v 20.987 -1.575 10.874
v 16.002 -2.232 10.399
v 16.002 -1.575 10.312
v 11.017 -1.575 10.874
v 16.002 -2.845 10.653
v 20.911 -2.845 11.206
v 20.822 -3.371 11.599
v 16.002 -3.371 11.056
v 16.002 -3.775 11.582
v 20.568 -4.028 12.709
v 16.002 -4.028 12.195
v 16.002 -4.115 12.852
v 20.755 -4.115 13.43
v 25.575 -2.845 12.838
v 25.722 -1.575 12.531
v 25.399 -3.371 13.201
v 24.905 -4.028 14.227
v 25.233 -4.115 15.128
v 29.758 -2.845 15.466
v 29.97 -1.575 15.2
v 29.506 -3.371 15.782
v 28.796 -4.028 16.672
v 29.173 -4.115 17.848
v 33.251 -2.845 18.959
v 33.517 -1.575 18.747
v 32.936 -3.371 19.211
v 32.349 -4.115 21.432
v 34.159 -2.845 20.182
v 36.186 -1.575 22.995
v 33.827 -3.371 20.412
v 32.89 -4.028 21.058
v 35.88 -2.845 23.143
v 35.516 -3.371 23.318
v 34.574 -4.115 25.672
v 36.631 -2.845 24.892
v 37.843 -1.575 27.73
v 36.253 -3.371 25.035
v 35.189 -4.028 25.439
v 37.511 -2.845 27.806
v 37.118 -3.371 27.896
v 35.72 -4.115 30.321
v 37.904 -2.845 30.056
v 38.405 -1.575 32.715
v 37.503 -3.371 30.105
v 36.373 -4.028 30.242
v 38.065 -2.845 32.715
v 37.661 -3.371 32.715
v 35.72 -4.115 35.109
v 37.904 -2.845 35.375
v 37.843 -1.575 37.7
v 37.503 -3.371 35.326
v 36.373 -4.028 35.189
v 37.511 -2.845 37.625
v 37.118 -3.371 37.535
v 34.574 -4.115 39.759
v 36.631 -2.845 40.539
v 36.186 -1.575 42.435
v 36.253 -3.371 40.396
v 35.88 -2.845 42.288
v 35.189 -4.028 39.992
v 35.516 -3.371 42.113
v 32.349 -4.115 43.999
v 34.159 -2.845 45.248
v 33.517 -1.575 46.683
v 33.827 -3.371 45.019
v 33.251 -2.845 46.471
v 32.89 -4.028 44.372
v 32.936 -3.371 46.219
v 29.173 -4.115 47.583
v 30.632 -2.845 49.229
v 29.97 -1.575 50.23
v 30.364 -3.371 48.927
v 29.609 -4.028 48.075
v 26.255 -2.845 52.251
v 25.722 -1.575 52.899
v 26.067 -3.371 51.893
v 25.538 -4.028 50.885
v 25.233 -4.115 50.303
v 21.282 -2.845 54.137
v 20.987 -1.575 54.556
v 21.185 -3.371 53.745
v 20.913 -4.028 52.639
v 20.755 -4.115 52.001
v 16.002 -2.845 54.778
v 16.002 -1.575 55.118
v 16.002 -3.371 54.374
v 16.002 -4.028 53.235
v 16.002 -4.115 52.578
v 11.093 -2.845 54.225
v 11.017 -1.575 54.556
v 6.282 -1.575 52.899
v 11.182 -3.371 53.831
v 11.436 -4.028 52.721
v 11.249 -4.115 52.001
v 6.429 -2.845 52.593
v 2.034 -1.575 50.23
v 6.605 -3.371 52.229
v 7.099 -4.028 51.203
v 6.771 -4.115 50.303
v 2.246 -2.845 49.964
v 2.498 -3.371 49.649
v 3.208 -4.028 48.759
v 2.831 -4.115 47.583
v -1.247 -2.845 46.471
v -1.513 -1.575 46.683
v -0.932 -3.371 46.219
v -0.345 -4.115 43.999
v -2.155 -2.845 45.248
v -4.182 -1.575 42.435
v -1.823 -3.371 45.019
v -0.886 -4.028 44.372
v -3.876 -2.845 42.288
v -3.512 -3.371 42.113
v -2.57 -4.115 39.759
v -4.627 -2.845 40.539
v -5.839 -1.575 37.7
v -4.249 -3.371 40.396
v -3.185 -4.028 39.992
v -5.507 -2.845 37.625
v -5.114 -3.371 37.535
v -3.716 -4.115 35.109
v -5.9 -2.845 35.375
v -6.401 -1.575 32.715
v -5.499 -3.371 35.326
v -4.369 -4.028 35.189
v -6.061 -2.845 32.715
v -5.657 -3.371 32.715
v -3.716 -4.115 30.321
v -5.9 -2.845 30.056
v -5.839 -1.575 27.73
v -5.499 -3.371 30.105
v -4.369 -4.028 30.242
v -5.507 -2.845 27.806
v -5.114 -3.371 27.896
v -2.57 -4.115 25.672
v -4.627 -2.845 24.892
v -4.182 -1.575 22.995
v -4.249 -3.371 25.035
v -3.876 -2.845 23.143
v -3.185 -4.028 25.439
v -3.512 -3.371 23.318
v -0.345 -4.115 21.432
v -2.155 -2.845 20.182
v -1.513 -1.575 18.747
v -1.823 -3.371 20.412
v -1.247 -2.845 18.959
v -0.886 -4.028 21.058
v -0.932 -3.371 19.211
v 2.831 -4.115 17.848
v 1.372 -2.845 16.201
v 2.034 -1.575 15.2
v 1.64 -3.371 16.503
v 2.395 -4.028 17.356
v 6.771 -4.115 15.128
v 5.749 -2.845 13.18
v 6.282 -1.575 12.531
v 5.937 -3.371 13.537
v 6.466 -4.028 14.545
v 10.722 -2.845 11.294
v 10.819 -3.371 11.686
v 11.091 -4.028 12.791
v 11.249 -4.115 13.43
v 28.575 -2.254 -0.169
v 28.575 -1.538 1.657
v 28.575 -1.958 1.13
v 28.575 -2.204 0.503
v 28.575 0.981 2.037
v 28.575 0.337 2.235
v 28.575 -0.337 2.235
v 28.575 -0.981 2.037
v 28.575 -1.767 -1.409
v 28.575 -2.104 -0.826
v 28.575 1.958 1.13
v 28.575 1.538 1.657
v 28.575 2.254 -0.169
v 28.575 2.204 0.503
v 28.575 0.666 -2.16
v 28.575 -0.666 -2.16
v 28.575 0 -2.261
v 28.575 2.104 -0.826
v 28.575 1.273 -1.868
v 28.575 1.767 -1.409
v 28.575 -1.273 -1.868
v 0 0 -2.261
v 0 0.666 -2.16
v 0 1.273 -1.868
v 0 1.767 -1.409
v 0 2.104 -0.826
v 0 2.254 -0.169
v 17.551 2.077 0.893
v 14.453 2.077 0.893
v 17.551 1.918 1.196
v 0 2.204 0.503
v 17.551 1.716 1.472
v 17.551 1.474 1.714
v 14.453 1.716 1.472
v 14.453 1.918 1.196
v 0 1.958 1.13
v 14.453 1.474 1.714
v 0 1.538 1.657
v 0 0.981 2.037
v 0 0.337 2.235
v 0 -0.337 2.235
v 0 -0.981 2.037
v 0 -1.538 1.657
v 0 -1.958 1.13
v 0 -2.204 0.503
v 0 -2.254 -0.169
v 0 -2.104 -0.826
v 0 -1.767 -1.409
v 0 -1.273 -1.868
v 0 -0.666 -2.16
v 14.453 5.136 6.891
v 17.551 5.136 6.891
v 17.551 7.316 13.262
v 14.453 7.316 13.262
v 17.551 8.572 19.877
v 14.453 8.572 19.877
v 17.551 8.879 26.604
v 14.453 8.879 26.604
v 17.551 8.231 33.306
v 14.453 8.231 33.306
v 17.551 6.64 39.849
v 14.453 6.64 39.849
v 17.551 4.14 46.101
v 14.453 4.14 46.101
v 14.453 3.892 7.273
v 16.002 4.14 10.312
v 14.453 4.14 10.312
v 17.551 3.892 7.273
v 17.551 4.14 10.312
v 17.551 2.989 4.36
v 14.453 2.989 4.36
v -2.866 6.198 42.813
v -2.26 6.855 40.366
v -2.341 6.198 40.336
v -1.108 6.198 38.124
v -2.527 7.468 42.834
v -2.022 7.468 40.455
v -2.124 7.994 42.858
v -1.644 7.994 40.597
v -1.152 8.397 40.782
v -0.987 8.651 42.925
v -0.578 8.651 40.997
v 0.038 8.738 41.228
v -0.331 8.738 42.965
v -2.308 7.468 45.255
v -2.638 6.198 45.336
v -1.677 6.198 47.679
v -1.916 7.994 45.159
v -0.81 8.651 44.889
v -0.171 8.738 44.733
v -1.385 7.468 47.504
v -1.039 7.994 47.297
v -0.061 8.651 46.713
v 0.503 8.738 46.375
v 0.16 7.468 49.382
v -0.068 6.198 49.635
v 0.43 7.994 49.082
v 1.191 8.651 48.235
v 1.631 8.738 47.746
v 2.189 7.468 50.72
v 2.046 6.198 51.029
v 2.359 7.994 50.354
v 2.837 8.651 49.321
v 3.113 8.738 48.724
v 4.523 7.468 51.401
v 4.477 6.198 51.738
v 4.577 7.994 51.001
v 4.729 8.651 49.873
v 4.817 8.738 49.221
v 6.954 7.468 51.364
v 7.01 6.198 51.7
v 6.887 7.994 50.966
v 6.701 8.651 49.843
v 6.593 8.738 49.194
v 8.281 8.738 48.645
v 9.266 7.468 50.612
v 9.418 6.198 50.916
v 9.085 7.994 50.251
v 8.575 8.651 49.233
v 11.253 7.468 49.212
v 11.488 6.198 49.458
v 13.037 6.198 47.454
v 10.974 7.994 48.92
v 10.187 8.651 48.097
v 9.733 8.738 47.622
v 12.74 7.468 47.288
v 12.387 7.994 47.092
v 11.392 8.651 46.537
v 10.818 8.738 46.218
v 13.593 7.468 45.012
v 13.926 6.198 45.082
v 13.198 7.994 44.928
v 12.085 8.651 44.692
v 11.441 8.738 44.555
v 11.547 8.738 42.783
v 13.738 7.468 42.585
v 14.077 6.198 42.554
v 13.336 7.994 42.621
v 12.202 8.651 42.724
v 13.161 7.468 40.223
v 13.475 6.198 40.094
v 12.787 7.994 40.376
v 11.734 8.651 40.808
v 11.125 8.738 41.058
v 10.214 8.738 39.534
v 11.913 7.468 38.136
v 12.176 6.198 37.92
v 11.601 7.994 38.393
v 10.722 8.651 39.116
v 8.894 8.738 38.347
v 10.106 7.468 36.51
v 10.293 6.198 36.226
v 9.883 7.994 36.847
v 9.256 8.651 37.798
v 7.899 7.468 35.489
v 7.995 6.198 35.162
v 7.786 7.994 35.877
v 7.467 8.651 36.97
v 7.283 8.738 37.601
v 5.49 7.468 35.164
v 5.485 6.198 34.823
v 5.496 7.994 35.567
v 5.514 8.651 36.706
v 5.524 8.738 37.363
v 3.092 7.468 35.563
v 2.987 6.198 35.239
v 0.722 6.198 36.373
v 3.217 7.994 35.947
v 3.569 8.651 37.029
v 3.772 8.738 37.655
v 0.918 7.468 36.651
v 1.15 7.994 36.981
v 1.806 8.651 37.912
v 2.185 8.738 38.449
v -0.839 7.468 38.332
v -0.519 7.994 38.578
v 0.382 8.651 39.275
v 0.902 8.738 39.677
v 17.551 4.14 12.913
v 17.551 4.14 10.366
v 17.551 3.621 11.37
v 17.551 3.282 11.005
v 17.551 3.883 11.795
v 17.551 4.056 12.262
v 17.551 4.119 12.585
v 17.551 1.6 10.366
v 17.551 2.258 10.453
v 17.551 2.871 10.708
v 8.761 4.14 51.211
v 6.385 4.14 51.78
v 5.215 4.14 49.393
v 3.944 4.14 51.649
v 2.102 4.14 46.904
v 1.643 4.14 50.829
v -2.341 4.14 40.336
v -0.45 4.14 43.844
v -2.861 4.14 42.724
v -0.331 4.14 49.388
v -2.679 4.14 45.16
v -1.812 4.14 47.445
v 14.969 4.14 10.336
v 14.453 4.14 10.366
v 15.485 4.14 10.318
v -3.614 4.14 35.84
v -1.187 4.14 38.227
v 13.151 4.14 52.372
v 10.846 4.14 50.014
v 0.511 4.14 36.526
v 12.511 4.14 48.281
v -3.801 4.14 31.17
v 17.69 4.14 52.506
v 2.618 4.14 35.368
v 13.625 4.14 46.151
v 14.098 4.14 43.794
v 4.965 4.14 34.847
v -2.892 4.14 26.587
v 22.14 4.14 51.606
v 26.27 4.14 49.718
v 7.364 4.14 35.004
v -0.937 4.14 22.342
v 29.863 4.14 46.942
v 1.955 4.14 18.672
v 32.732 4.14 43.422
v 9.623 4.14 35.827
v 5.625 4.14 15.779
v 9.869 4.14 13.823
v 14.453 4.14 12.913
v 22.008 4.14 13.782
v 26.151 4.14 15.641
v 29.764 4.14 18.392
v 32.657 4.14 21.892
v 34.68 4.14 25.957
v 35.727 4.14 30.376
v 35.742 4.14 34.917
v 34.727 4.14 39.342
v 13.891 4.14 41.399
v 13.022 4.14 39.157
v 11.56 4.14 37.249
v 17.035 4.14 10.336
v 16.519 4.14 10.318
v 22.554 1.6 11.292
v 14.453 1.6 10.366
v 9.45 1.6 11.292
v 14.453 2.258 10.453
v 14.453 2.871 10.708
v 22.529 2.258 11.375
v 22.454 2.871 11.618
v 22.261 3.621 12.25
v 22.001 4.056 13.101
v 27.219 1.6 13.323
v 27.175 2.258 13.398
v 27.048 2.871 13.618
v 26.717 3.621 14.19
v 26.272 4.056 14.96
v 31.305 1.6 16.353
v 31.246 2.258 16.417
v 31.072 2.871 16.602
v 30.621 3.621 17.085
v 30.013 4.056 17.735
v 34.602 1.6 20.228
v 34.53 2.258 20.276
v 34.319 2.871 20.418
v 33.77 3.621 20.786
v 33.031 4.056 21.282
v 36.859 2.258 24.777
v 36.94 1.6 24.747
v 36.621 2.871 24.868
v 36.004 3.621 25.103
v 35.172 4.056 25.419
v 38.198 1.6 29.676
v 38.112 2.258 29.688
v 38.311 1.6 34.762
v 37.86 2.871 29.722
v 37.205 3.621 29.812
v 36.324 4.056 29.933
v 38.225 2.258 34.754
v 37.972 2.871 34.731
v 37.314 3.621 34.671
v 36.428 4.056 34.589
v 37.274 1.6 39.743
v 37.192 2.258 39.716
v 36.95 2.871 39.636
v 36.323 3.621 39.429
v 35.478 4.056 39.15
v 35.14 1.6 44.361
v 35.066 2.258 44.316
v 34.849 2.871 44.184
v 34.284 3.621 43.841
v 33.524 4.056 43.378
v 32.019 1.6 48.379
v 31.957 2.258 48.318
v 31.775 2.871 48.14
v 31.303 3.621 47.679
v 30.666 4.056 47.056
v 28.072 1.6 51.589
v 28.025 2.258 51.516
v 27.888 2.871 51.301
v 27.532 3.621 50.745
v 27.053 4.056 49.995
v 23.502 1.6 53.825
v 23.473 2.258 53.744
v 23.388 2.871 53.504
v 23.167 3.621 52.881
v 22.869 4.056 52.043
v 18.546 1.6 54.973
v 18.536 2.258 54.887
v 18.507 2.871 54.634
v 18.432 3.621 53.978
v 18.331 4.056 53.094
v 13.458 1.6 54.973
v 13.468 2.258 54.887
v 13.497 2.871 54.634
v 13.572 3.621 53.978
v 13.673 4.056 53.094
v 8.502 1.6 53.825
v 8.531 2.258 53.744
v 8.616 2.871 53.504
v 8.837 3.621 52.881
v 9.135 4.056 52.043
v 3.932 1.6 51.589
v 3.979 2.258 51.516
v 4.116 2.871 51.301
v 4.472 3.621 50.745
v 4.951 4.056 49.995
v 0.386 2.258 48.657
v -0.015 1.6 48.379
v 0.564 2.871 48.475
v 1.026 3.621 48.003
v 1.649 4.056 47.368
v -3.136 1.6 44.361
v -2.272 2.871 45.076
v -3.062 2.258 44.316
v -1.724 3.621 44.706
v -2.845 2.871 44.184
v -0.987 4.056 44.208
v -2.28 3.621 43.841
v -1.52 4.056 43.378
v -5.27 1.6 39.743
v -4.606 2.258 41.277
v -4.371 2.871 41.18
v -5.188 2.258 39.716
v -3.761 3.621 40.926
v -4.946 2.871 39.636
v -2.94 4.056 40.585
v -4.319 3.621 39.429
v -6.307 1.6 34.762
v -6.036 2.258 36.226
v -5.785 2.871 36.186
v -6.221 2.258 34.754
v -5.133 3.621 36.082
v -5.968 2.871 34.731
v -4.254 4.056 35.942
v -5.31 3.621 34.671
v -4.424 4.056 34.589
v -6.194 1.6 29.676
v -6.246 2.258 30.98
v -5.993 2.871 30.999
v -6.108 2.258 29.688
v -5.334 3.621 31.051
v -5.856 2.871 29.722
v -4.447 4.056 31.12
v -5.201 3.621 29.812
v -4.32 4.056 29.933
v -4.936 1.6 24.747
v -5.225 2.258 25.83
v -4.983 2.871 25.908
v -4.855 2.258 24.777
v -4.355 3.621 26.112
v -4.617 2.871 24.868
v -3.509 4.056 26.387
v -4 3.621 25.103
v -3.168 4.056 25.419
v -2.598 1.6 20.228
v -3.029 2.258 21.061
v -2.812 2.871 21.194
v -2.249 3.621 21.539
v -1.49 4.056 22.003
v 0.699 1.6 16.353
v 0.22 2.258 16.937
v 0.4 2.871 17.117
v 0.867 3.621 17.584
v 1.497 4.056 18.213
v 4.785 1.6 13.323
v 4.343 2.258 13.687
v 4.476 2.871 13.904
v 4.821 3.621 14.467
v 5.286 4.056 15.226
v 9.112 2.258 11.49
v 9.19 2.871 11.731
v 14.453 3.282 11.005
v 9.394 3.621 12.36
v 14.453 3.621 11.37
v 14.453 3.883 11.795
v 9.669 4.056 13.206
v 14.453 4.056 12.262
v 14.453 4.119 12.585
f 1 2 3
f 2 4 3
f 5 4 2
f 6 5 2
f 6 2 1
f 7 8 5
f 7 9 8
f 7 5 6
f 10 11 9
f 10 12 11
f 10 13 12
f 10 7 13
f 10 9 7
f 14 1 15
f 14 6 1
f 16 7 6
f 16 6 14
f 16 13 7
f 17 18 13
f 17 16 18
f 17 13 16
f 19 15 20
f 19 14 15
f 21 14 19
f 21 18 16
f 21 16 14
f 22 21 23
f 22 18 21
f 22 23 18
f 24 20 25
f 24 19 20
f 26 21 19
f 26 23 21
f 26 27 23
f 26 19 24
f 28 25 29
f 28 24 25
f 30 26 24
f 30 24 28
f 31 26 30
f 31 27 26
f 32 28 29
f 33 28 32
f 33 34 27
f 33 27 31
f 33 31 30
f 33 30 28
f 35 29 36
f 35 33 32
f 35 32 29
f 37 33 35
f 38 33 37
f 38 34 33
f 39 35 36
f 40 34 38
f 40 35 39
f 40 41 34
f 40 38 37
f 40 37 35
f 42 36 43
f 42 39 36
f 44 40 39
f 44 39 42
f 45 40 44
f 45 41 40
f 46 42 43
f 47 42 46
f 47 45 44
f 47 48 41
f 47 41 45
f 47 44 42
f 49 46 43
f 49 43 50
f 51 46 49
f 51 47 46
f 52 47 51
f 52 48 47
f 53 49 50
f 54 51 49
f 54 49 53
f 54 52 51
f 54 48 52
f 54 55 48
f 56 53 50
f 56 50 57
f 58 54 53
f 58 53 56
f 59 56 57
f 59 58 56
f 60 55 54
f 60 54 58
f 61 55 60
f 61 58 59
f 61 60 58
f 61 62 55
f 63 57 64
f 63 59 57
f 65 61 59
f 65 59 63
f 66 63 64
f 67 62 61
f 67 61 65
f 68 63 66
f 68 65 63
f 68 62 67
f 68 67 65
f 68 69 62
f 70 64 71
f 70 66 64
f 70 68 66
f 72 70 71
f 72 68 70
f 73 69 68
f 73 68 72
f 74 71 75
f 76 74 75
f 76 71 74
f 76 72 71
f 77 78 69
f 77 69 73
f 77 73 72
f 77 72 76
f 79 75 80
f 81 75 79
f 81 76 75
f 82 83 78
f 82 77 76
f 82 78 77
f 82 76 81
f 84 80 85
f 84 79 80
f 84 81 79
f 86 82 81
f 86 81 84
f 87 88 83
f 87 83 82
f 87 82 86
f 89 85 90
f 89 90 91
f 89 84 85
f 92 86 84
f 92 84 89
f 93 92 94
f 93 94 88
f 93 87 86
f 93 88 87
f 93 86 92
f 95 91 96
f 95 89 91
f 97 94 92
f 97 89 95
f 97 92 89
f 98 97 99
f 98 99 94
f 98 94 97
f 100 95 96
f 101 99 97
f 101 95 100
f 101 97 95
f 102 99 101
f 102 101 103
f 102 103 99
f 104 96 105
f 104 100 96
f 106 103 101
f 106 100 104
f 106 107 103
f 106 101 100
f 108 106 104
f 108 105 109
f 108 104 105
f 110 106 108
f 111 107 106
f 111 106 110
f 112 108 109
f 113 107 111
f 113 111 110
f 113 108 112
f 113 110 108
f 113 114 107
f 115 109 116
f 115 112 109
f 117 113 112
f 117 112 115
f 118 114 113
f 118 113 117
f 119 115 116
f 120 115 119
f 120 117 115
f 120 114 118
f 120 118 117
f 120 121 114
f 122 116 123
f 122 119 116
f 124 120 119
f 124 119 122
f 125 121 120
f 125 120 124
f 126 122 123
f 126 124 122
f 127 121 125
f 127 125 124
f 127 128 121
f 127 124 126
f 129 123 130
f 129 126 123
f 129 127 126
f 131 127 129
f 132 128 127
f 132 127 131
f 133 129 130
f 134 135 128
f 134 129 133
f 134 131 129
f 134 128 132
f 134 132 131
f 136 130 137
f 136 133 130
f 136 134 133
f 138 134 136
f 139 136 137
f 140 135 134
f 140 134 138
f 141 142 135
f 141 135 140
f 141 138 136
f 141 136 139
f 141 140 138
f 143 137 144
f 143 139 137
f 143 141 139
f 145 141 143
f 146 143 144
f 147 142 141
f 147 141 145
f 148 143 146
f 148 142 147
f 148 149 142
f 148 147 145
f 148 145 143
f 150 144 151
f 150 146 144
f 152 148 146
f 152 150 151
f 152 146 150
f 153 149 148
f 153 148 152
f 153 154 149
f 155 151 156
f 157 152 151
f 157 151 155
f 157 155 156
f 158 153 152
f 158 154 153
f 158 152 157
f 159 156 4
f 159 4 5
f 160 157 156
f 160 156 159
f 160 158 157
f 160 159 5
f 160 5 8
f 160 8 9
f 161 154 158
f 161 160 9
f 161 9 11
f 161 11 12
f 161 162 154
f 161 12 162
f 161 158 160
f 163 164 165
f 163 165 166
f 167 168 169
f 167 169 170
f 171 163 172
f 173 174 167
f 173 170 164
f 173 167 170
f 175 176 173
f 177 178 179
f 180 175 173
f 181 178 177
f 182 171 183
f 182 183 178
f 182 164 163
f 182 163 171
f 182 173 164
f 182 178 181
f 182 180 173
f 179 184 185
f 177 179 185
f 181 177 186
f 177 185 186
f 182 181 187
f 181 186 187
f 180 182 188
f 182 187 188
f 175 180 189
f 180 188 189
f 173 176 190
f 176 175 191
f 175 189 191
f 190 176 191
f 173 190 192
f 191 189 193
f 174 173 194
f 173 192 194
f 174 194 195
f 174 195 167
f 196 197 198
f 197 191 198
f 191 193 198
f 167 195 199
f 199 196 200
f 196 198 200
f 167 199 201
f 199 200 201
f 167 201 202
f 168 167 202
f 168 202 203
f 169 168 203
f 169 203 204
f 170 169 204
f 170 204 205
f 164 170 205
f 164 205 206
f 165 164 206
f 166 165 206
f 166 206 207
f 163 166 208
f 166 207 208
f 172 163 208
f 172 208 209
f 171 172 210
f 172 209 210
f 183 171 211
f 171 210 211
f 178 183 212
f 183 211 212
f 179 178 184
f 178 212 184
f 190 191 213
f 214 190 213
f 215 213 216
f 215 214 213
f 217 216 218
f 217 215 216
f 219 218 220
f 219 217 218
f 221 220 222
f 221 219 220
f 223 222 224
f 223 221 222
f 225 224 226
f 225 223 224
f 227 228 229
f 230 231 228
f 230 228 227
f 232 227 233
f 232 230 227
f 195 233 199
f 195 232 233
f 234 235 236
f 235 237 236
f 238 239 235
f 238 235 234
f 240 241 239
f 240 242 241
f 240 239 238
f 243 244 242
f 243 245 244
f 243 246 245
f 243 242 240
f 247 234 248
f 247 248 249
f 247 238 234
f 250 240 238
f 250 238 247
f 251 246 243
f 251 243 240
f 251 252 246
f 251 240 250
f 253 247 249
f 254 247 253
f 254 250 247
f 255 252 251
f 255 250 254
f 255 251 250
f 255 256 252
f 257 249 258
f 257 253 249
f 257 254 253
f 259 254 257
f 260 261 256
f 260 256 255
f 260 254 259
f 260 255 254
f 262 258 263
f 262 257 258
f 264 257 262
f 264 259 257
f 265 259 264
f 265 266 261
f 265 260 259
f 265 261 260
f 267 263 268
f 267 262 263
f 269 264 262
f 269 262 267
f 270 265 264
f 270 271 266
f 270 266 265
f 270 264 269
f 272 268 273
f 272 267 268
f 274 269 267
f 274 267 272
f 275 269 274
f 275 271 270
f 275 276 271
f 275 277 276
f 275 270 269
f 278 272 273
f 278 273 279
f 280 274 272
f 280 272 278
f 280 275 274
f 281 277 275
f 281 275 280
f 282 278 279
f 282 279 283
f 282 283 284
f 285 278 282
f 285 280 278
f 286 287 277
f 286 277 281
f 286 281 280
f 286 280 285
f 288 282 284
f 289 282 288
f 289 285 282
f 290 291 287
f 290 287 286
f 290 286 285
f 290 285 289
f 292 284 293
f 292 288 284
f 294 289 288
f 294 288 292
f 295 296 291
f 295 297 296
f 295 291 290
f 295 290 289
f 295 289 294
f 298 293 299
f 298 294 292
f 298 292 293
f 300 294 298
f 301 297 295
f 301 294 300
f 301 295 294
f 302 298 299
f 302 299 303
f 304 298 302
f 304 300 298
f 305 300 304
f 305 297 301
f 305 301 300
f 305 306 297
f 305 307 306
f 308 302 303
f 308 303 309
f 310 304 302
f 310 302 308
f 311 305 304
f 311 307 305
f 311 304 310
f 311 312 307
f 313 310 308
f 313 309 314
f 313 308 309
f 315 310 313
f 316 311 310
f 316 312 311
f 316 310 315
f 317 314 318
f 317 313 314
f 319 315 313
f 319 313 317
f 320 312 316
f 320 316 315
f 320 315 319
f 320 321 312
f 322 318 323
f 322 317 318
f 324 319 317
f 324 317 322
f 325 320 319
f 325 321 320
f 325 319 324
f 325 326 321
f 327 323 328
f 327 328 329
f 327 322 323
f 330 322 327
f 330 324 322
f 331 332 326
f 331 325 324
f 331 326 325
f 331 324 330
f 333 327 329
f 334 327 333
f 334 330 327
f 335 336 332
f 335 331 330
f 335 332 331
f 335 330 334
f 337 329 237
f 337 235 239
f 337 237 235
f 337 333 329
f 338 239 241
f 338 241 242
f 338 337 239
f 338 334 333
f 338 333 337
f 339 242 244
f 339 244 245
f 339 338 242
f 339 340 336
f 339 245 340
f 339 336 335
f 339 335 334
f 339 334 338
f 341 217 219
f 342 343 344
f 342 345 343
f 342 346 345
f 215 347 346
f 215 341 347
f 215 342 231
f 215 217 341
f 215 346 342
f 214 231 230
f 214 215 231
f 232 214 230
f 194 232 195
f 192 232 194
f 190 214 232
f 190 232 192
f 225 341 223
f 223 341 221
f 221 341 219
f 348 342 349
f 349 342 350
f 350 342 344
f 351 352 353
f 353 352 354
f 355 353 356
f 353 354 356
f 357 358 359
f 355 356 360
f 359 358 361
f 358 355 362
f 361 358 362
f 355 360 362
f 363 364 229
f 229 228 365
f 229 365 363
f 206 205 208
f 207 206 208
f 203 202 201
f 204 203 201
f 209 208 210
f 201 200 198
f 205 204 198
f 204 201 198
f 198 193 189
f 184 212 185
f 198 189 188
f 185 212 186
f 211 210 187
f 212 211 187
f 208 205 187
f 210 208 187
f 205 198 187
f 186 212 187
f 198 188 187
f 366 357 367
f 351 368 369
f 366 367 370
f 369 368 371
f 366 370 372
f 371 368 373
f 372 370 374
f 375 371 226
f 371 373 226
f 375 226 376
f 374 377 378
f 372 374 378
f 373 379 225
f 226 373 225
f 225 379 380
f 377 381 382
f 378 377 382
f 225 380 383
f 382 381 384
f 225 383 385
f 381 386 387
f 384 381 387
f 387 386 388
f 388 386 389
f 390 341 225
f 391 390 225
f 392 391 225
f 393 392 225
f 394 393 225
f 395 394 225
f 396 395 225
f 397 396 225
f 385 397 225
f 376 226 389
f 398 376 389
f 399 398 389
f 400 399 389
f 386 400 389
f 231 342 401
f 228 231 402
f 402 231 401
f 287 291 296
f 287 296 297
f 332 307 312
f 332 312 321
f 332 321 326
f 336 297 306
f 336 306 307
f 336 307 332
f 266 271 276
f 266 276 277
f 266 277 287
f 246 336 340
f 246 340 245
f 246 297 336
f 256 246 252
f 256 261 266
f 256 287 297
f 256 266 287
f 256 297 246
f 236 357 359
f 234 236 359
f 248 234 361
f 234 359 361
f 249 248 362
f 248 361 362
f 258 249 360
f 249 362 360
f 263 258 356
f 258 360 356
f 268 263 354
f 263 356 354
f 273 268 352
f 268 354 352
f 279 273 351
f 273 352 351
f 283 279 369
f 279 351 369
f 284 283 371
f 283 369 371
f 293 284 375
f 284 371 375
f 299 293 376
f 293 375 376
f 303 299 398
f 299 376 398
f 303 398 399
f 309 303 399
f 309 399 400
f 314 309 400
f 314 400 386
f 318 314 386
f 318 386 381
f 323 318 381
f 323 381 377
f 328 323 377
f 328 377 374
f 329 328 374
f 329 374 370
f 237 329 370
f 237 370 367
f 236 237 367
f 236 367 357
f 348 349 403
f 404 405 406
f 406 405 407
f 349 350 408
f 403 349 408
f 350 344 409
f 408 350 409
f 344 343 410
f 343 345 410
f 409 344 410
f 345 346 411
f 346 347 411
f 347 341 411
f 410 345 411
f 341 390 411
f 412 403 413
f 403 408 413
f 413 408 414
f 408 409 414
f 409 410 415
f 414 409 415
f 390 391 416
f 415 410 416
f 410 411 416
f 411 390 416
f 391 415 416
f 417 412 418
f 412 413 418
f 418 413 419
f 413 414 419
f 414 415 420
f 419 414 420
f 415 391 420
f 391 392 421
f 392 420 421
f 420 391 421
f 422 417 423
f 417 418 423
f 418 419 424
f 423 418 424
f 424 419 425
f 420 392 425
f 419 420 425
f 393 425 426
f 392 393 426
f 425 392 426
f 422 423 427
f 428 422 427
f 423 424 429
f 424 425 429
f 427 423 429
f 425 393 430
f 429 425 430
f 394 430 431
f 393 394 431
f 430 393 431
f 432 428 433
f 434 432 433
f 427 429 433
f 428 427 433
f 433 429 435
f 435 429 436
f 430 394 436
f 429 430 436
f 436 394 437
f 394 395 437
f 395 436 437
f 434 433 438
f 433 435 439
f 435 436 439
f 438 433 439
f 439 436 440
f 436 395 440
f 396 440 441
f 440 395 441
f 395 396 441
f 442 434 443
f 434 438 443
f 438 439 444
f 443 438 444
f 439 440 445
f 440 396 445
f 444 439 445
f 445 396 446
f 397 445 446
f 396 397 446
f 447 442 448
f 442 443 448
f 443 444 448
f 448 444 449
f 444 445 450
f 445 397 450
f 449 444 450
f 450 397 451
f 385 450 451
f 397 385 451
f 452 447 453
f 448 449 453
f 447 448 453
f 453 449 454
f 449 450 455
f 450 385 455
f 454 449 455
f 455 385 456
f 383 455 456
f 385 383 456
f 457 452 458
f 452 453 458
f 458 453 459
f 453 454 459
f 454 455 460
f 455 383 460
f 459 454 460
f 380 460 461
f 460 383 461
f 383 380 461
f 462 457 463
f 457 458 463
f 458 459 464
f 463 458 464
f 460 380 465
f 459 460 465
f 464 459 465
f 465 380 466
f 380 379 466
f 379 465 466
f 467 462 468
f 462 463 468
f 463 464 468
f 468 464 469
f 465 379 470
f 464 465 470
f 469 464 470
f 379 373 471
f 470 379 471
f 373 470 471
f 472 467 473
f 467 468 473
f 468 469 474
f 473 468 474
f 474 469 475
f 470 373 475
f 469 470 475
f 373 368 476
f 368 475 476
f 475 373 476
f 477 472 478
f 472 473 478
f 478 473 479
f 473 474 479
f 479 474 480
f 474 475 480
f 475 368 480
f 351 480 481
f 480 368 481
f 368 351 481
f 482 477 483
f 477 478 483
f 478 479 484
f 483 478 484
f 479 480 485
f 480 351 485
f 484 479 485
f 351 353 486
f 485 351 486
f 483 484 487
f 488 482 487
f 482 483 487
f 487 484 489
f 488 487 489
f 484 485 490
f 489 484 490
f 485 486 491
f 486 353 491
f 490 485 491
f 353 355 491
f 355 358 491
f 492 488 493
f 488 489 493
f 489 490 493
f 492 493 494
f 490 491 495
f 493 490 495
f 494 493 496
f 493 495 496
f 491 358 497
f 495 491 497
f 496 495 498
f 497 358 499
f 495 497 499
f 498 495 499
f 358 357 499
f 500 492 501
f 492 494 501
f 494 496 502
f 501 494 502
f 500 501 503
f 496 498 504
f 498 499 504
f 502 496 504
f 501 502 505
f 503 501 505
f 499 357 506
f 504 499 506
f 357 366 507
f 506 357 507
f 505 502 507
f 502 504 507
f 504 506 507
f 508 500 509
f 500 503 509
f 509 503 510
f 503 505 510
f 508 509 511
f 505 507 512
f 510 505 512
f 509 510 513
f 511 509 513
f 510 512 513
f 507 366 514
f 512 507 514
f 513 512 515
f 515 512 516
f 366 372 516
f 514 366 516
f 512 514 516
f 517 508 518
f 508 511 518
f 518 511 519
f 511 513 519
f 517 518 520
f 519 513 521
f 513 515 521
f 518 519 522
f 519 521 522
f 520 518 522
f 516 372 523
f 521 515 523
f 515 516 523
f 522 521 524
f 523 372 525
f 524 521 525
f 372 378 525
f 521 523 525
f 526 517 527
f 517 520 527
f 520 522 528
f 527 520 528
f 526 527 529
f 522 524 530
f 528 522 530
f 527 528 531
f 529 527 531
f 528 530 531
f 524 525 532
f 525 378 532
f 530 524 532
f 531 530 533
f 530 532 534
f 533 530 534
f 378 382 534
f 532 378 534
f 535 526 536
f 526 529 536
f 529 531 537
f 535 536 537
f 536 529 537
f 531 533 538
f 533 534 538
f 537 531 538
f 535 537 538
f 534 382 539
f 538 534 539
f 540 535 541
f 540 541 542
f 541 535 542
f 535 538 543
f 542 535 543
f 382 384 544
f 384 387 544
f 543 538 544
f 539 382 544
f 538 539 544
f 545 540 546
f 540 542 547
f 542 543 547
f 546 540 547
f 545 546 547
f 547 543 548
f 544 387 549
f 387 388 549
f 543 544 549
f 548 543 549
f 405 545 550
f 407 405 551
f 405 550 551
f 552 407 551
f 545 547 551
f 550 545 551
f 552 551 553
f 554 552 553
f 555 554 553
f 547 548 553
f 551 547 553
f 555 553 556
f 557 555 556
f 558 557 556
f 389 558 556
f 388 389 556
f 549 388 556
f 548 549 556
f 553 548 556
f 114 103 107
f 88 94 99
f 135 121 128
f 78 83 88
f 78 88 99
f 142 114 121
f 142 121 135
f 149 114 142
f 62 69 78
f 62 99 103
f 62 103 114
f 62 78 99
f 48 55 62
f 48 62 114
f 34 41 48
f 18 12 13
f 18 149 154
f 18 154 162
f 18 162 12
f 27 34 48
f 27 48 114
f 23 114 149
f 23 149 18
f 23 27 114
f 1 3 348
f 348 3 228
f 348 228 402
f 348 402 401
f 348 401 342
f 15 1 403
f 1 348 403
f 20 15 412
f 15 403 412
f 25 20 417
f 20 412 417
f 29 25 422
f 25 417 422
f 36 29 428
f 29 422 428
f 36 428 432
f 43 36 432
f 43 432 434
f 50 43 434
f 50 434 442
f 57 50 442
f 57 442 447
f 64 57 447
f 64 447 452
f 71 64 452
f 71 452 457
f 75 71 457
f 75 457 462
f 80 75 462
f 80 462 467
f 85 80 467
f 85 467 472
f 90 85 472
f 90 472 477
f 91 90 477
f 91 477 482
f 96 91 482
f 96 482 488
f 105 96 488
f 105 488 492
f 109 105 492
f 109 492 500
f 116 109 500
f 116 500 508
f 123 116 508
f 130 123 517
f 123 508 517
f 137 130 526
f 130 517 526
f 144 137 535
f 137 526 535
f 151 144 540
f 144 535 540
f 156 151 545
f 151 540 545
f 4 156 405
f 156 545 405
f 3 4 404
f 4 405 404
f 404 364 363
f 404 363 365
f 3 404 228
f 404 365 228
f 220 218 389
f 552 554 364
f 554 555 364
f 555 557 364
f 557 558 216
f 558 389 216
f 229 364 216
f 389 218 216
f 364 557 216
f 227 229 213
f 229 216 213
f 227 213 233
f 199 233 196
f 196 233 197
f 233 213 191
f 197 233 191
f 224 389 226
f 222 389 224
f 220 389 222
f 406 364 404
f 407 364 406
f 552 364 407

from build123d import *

# Parameters (mm, degrees)
SKETCH1_R           = 2.2606
BOSS_EXTRUDE1_DEPTH = 28.575
BOSS_EXTRUDE2_DEPTH = 3.0988
SKETCH3_R           = 22.4028
BOSS_EXTRUDE3_DEPTH = 8.255
FILLET1_R           = 2.54
SKETCH4_R           = 8.4963
BOSS_EXTRUDE4_DEPTH = 4.5974
FILLET2_R           = 2.54


with BuildPart() as part:
    # Sketch1 → Boss-Extrude1 (new body)
    with BuildSketch(Plane(origin=(0, 0, 0), x_dir=(0, 0, -1), z_dir=(1, 0, 0))):
        Circle(SKETCH1_R)
    extrude(amount=BOSS_EXTRUDE1_DEPTH)

    # Sketch2 → Boss-Extrude2 (add)
    with BuildSketch(Plane(origin=(17.5514, 0, 0), x_dir=(0, 0, -1), z_dir=(1, 0, 0))):
        with BuildLine():
            Line((-46.101, 4.1402), (-10.3124, 4.1402))
            ThreePointArc((-10.3124, 4.1402), (-4.725931778, 3.141811032), (0, 0))
            Line((0, 0), (2.2606, 0))
            ThreePointArc((2.2606, 0), (-21.350803051, 8.721215285), (-46.101, 4.1402))
        make_face()
    extrude(amount=-BOSS_EXTRUDE2_DEPTH)

    # Sketch3 → Boss-Extrude3 (add)
    with BuildSketch(Plane.XZ.offset(-4.1402)):
        with Locations(Location((16.002, 32.7152, 0), (0, 0, 270))):
            Circle(SKETCH3_R)
    extrude(amount=BOSS_EXTRUDE3_DEPTH)

    # Fillet1
    fillet1_edges = [part.edges().sort_by_distance(p)[0] for p in [
        (16.002, 4.1402, 55.118),
        (16.002, -4.1148, 55.118),
    ]]
    fillet(fillet1_edges, radius=FILLET1_R)

    # Sketch4 → Boss-Extrude4 (add)
    with BuildSketch(Plane(origin=(0, 4.1402, 0), x_dir=(1, 0, 0), z_dir=(0, 1, 0))):
        with Locations(Location((5.61488389, -43.318674516, 0), (0, 0, 159.448311982))):
            Circle(SKETCH4_R)
    extrude(amount=BOSS_EXTRUDE4_DEPTH)

    # Fillet2
    fillet2_edges = [part.edges().sort_by_distance(p)[0] for p in [
        (13.570444327, 8.7376, 46.301319621),
    ]]
    fillet(fillet2_edges, radius=FILLET2_R)


solid = part.part
